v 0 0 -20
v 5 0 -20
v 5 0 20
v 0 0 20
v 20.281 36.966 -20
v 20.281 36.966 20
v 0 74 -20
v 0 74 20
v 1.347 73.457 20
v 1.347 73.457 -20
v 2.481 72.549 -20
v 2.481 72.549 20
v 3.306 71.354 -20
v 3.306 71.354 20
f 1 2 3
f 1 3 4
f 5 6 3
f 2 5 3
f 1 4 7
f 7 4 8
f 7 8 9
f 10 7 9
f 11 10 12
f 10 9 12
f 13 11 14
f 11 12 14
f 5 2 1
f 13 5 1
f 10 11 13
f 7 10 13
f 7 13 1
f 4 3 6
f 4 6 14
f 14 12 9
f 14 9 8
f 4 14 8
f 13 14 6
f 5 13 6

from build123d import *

# Parameters (mm, degrees)
BOSS_EXTRUDE1_DEPTH = 20
FILLET3_R           = 5


with BuildPart() as part:
    # Sketch1 → Boss-Extrude1 (new, symmetric)
    with BuildSketch(Plane.XY):
        Polygon((0, 0), (0, 74), (2, 74), (20.281232104, 36.965983625), (5, 0), align=None)
    extrude(amount=BOSS_EXTRUDE1_DEPTH, both=True)

    # Fillet3
    # the kernel refuses this fillet: 5 mm, written as the material it takes off along each edge
    with BuildSketch(Plane(origin=(2, 74, 27.377711493), x_dir=(0.4426407168839213, -0.8966990552891692, 0), z_dir=(0, 0, -1))) as fillet3_piece_1:
        with BuildLine():
            CenterArc((2.951084597, 5), FILLET3_R, 219.89034736, 50.10965264)
            Line((-0.885281434, 1.793398111), (-0.962008754, 1.729266073))
            ThreePointArc((-0.962008754, 1.729266073), (-0.532310622, 0.852434984), (-0.089669906, -0.044264072))
            Line((-0.089669906, -0.044264072), (0, -0.1))
            Line((0, -0.1), (2.951084597, -0.1))
            Line((2.951084597, -0.1), (2.951084597, 0))
        make_face()
    extrude(amount=54.755422985, mode=Mode.SUBTRACT)


solid = part.part
